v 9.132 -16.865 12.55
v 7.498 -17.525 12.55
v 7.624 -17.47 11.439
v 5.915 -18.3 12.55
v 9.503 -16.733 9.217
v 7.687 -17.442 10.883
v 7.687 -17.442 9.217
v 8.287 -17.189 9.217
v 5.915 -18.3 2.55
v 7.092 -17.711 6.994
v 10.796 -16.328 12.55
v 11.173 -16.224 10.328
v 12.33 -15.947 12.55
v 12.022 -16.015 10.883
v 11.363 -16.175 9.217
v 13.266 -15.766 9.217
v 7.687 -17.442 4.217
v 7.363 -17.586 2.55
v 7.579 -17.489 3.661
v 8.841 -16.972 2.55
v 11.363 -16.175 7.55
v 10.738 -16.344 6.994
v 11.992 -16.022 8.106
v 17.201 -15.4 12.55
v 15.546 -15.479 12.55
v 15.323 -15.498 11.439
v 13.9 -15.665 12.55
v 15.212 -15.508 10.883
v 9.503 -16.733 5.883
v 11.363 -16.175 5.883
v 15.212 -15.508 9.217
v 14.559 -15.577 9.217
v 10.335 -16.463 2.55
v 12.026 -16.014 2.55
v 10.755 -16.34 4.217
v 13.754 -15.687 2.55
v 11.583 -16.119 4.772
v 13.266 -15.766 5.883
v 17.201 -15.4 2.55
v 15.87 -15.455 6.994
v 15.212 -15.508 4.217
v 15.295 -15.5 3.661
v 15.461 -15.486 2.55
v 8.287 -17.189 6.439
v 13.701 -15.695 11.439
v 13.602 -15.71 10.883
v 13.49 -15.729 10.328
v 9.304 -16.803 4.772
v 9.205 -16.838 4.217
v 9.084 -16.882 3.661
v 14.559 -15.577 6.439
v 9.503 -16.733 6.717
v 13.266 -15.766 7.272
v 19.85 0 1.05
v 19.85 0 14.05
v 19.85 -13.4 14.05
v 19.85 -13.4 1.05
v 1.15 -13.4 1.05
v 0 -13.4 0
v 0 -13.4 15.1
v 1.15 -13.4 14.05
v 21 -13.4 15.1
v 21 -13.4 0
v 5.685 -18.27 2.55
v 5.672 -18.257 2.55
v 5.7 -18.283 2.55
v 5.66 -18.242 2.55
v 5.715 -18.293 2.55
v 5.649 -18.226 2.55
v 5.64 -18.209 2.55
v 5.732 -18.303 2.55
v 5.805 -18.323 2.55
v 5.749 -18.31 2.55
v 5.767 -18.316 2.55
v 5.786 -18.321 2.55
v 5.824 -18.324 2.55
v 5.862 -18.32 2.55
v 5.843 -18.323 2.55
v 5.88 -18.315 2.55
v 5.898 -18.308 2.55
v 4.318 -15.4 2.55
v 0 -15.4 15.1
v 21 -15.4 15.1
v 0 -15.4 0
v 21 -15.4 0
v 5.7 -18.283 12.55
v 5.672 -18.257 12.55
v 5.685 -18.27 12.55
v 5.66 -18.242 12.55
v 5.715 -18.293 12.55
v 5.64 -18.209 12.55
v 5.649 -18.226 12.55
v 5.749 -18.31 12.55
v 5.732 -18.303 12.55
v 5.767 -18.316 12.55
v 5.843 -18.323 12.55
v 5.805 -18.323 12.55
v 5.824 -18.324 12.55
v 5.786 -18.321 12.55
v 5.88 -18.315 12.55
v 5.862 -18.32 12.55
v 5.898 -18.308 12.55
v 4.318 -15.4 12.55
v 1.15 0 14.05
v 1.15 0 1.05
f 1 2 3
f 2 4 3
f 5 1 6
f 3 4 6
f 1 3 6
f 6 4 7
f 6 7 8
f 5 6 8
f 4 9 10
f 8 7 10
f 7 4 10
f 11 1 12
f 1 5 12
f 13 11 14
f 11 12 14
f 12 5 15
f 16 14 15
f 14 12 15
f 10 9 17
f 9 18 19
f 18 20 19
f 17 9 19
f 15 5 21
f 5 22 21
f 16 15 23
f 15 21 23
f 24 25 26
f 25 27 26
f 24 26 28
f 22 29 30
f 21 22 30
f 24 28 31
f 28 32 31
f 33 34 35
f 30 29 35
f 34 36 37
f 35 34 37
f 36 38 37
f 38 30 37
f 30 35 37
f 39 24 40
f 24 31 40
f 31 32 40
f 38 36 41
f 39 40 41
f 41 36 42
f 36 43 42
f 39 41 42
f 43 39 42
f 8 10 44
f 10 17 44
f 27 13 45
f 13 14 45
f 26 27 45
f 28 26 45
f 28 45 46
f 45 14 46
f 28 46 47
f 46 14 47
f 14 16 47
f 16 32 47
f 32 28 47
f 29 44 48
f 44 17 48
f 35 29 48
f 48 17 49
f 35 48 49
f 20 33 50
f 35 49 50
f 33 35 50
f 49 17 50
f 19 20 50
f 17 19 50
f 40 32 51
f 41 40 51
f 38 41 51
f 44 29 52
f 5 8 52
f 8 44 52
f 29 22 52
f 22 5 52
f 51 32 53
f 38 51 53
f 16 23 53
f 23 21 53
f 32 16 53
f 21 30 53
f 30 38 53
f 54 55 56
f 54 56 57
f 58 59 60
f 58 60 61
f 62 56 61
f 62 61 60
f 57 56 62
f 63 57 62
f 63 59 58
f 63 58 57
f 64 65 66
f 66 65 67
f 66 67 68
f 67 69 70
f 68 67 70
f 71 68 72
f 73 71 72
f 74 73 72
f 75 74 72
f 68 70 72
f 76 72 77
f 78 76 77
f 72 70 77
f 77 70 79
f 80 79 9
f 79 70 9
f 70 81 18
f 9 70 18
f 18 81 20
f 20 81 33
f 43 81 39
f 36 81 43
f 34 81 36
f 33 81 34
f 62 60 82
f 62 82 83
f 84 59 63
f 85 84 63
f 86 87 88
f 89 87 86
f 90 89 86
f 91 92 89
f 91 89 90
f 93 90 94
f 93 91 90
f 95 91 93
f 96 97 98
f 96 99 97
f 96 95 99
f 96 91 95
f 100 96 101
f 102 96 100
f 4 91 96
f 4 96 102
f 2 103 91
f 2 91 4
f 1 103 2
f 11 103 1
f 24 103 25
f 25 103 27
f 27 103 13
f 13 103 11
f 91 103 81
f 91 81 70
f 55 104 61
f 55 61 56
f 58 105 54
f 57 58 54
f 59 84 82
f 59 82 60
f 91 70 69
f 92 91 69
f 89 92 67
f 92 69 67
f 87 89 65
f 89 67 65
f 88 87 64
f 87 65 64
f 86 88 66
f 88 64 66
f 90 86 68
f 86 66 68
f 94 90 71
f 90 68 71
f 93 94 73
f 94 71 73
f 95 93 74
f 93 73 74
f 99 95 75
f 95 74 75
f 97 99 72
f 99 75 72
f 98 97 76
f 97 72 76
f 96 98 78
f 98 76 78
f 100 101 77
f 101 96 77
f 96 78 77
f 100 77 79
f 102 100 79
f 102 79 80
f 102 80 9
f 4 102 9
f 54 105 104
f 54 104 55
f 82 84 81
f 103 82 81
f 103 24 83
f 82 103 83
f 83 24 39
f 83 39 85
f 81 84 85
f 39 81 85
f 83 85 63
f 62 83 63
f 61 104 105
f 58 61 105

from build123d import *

# Parameters (mm, degrees)
SKETCH1_W           = 21
SKETCH1_H           = 15.4
BOSS_EXTRUDE1_DEPTH = 15.1
SKETCH3_W           = 21
SKETCH3_H           = 15.1
SKETCH3_W_2         = 18.7
SKETCH3_H_2         = 13
CUT_EXTRUDE1_DEPTH  = 13.4
SKETCH4_W           = 18
SKETCH4_H           = 10
BOSS_EXTRUDE2_DEPTH = 3
CUT_EXTRUDE2_DEPTH  = 13.55


with BuildPart() as part:
    # Sketch1 → Boss-Extrude1 (new body)
    with BuildSketch(Plane.XY):
        with Locations((10.5, -7.7)):
            Rectangle(SKETCH1_W, SKETCH1_H)
    extrude(amount=BOSS_EXTRUDE1_DEPTH)

    # Sketch3 → Cut-Extrude1 (cut)
    with BuildSketch(Plane(origin=(0, 0, 0), x_dir=(1, 0, 0), z_dir=(0, 1, 0))):
        with Locations((10.5, -7.55)):
            Rectangle(SKETCH3_W, SKETCH3_H)
        with Locations((10.5, -7.55)):
            Rectangle(SKETCH3_W_2, SKETCH3_H_2, mode=Mode.SUBTRACT)
    extrude(amount=-CUT_EXTRUDE1_DEPTH, mode=Mode.SUBTRACT)

    # Sketch4 → Boss-Extrude2 (add)
    with BuildSketch(Plane.XZ.offset(15.4)):
        with Locations((10.5, 7.55)):
            Rectangle(SKETCH4_W, SKETCH4_H)
    extrude(amount=BOSS_EXTRUDE2_DEPTH)

    # Sketch5 → Cut-Extrude2 (cut, through all)
    with BuildSketch(Plane(origin=(0, 0, 2.55), x_dir=(-1, 0, 0), z_dir=(0, 0, -1))):
        with BuildLine():
            Line((-4.318187888, -15.4), (-5.64025516, -18.208957591))
            ThreePointArc((-5.64025516, -18.208957591), (-5.758218198, -18.313607167), (-5.91534374, -18.300251418))
            add(Edge.make_bspline(
                [(-5.91534374, -18.300251418), (-9.414175538, -16.433895122), (-13.180982291, -15.465516785), (-17.200671876, -15.4)],
                knots=[0.017358171, 0.017358171, 0.017358171, 0.017358171, 1, 1, 1, 1], degree=3))
            Line((-17.200671876, -15.4), (-19.5, -15.4))
            Line((-19.5, -15.4), (-20.228637612, -15.606353341))
            Line((-20.228637612, -15.606353341), (-20.675659597, -18.662431802))
            Line((-20.675659597, -18.662431802), (-18.82613024, -20.157147076))
            Line((-18.82613024, -20.157147076), (-11.911793742, -20.360373848))
            Line((-11.911793742, -20.360373848), (-0.335637878, -21.060292332))
            Line((-0.335637878, -21.060292332), (-0.808442559, -15.4))
            Line((-0.808442559, -15.4), (-4.318187888, -15.4))
        make_face()
    extrude(amount=-CUT_EXTRUDE2_DEPTH, mode=Mode.SUBTRACT)


solid = part.part
